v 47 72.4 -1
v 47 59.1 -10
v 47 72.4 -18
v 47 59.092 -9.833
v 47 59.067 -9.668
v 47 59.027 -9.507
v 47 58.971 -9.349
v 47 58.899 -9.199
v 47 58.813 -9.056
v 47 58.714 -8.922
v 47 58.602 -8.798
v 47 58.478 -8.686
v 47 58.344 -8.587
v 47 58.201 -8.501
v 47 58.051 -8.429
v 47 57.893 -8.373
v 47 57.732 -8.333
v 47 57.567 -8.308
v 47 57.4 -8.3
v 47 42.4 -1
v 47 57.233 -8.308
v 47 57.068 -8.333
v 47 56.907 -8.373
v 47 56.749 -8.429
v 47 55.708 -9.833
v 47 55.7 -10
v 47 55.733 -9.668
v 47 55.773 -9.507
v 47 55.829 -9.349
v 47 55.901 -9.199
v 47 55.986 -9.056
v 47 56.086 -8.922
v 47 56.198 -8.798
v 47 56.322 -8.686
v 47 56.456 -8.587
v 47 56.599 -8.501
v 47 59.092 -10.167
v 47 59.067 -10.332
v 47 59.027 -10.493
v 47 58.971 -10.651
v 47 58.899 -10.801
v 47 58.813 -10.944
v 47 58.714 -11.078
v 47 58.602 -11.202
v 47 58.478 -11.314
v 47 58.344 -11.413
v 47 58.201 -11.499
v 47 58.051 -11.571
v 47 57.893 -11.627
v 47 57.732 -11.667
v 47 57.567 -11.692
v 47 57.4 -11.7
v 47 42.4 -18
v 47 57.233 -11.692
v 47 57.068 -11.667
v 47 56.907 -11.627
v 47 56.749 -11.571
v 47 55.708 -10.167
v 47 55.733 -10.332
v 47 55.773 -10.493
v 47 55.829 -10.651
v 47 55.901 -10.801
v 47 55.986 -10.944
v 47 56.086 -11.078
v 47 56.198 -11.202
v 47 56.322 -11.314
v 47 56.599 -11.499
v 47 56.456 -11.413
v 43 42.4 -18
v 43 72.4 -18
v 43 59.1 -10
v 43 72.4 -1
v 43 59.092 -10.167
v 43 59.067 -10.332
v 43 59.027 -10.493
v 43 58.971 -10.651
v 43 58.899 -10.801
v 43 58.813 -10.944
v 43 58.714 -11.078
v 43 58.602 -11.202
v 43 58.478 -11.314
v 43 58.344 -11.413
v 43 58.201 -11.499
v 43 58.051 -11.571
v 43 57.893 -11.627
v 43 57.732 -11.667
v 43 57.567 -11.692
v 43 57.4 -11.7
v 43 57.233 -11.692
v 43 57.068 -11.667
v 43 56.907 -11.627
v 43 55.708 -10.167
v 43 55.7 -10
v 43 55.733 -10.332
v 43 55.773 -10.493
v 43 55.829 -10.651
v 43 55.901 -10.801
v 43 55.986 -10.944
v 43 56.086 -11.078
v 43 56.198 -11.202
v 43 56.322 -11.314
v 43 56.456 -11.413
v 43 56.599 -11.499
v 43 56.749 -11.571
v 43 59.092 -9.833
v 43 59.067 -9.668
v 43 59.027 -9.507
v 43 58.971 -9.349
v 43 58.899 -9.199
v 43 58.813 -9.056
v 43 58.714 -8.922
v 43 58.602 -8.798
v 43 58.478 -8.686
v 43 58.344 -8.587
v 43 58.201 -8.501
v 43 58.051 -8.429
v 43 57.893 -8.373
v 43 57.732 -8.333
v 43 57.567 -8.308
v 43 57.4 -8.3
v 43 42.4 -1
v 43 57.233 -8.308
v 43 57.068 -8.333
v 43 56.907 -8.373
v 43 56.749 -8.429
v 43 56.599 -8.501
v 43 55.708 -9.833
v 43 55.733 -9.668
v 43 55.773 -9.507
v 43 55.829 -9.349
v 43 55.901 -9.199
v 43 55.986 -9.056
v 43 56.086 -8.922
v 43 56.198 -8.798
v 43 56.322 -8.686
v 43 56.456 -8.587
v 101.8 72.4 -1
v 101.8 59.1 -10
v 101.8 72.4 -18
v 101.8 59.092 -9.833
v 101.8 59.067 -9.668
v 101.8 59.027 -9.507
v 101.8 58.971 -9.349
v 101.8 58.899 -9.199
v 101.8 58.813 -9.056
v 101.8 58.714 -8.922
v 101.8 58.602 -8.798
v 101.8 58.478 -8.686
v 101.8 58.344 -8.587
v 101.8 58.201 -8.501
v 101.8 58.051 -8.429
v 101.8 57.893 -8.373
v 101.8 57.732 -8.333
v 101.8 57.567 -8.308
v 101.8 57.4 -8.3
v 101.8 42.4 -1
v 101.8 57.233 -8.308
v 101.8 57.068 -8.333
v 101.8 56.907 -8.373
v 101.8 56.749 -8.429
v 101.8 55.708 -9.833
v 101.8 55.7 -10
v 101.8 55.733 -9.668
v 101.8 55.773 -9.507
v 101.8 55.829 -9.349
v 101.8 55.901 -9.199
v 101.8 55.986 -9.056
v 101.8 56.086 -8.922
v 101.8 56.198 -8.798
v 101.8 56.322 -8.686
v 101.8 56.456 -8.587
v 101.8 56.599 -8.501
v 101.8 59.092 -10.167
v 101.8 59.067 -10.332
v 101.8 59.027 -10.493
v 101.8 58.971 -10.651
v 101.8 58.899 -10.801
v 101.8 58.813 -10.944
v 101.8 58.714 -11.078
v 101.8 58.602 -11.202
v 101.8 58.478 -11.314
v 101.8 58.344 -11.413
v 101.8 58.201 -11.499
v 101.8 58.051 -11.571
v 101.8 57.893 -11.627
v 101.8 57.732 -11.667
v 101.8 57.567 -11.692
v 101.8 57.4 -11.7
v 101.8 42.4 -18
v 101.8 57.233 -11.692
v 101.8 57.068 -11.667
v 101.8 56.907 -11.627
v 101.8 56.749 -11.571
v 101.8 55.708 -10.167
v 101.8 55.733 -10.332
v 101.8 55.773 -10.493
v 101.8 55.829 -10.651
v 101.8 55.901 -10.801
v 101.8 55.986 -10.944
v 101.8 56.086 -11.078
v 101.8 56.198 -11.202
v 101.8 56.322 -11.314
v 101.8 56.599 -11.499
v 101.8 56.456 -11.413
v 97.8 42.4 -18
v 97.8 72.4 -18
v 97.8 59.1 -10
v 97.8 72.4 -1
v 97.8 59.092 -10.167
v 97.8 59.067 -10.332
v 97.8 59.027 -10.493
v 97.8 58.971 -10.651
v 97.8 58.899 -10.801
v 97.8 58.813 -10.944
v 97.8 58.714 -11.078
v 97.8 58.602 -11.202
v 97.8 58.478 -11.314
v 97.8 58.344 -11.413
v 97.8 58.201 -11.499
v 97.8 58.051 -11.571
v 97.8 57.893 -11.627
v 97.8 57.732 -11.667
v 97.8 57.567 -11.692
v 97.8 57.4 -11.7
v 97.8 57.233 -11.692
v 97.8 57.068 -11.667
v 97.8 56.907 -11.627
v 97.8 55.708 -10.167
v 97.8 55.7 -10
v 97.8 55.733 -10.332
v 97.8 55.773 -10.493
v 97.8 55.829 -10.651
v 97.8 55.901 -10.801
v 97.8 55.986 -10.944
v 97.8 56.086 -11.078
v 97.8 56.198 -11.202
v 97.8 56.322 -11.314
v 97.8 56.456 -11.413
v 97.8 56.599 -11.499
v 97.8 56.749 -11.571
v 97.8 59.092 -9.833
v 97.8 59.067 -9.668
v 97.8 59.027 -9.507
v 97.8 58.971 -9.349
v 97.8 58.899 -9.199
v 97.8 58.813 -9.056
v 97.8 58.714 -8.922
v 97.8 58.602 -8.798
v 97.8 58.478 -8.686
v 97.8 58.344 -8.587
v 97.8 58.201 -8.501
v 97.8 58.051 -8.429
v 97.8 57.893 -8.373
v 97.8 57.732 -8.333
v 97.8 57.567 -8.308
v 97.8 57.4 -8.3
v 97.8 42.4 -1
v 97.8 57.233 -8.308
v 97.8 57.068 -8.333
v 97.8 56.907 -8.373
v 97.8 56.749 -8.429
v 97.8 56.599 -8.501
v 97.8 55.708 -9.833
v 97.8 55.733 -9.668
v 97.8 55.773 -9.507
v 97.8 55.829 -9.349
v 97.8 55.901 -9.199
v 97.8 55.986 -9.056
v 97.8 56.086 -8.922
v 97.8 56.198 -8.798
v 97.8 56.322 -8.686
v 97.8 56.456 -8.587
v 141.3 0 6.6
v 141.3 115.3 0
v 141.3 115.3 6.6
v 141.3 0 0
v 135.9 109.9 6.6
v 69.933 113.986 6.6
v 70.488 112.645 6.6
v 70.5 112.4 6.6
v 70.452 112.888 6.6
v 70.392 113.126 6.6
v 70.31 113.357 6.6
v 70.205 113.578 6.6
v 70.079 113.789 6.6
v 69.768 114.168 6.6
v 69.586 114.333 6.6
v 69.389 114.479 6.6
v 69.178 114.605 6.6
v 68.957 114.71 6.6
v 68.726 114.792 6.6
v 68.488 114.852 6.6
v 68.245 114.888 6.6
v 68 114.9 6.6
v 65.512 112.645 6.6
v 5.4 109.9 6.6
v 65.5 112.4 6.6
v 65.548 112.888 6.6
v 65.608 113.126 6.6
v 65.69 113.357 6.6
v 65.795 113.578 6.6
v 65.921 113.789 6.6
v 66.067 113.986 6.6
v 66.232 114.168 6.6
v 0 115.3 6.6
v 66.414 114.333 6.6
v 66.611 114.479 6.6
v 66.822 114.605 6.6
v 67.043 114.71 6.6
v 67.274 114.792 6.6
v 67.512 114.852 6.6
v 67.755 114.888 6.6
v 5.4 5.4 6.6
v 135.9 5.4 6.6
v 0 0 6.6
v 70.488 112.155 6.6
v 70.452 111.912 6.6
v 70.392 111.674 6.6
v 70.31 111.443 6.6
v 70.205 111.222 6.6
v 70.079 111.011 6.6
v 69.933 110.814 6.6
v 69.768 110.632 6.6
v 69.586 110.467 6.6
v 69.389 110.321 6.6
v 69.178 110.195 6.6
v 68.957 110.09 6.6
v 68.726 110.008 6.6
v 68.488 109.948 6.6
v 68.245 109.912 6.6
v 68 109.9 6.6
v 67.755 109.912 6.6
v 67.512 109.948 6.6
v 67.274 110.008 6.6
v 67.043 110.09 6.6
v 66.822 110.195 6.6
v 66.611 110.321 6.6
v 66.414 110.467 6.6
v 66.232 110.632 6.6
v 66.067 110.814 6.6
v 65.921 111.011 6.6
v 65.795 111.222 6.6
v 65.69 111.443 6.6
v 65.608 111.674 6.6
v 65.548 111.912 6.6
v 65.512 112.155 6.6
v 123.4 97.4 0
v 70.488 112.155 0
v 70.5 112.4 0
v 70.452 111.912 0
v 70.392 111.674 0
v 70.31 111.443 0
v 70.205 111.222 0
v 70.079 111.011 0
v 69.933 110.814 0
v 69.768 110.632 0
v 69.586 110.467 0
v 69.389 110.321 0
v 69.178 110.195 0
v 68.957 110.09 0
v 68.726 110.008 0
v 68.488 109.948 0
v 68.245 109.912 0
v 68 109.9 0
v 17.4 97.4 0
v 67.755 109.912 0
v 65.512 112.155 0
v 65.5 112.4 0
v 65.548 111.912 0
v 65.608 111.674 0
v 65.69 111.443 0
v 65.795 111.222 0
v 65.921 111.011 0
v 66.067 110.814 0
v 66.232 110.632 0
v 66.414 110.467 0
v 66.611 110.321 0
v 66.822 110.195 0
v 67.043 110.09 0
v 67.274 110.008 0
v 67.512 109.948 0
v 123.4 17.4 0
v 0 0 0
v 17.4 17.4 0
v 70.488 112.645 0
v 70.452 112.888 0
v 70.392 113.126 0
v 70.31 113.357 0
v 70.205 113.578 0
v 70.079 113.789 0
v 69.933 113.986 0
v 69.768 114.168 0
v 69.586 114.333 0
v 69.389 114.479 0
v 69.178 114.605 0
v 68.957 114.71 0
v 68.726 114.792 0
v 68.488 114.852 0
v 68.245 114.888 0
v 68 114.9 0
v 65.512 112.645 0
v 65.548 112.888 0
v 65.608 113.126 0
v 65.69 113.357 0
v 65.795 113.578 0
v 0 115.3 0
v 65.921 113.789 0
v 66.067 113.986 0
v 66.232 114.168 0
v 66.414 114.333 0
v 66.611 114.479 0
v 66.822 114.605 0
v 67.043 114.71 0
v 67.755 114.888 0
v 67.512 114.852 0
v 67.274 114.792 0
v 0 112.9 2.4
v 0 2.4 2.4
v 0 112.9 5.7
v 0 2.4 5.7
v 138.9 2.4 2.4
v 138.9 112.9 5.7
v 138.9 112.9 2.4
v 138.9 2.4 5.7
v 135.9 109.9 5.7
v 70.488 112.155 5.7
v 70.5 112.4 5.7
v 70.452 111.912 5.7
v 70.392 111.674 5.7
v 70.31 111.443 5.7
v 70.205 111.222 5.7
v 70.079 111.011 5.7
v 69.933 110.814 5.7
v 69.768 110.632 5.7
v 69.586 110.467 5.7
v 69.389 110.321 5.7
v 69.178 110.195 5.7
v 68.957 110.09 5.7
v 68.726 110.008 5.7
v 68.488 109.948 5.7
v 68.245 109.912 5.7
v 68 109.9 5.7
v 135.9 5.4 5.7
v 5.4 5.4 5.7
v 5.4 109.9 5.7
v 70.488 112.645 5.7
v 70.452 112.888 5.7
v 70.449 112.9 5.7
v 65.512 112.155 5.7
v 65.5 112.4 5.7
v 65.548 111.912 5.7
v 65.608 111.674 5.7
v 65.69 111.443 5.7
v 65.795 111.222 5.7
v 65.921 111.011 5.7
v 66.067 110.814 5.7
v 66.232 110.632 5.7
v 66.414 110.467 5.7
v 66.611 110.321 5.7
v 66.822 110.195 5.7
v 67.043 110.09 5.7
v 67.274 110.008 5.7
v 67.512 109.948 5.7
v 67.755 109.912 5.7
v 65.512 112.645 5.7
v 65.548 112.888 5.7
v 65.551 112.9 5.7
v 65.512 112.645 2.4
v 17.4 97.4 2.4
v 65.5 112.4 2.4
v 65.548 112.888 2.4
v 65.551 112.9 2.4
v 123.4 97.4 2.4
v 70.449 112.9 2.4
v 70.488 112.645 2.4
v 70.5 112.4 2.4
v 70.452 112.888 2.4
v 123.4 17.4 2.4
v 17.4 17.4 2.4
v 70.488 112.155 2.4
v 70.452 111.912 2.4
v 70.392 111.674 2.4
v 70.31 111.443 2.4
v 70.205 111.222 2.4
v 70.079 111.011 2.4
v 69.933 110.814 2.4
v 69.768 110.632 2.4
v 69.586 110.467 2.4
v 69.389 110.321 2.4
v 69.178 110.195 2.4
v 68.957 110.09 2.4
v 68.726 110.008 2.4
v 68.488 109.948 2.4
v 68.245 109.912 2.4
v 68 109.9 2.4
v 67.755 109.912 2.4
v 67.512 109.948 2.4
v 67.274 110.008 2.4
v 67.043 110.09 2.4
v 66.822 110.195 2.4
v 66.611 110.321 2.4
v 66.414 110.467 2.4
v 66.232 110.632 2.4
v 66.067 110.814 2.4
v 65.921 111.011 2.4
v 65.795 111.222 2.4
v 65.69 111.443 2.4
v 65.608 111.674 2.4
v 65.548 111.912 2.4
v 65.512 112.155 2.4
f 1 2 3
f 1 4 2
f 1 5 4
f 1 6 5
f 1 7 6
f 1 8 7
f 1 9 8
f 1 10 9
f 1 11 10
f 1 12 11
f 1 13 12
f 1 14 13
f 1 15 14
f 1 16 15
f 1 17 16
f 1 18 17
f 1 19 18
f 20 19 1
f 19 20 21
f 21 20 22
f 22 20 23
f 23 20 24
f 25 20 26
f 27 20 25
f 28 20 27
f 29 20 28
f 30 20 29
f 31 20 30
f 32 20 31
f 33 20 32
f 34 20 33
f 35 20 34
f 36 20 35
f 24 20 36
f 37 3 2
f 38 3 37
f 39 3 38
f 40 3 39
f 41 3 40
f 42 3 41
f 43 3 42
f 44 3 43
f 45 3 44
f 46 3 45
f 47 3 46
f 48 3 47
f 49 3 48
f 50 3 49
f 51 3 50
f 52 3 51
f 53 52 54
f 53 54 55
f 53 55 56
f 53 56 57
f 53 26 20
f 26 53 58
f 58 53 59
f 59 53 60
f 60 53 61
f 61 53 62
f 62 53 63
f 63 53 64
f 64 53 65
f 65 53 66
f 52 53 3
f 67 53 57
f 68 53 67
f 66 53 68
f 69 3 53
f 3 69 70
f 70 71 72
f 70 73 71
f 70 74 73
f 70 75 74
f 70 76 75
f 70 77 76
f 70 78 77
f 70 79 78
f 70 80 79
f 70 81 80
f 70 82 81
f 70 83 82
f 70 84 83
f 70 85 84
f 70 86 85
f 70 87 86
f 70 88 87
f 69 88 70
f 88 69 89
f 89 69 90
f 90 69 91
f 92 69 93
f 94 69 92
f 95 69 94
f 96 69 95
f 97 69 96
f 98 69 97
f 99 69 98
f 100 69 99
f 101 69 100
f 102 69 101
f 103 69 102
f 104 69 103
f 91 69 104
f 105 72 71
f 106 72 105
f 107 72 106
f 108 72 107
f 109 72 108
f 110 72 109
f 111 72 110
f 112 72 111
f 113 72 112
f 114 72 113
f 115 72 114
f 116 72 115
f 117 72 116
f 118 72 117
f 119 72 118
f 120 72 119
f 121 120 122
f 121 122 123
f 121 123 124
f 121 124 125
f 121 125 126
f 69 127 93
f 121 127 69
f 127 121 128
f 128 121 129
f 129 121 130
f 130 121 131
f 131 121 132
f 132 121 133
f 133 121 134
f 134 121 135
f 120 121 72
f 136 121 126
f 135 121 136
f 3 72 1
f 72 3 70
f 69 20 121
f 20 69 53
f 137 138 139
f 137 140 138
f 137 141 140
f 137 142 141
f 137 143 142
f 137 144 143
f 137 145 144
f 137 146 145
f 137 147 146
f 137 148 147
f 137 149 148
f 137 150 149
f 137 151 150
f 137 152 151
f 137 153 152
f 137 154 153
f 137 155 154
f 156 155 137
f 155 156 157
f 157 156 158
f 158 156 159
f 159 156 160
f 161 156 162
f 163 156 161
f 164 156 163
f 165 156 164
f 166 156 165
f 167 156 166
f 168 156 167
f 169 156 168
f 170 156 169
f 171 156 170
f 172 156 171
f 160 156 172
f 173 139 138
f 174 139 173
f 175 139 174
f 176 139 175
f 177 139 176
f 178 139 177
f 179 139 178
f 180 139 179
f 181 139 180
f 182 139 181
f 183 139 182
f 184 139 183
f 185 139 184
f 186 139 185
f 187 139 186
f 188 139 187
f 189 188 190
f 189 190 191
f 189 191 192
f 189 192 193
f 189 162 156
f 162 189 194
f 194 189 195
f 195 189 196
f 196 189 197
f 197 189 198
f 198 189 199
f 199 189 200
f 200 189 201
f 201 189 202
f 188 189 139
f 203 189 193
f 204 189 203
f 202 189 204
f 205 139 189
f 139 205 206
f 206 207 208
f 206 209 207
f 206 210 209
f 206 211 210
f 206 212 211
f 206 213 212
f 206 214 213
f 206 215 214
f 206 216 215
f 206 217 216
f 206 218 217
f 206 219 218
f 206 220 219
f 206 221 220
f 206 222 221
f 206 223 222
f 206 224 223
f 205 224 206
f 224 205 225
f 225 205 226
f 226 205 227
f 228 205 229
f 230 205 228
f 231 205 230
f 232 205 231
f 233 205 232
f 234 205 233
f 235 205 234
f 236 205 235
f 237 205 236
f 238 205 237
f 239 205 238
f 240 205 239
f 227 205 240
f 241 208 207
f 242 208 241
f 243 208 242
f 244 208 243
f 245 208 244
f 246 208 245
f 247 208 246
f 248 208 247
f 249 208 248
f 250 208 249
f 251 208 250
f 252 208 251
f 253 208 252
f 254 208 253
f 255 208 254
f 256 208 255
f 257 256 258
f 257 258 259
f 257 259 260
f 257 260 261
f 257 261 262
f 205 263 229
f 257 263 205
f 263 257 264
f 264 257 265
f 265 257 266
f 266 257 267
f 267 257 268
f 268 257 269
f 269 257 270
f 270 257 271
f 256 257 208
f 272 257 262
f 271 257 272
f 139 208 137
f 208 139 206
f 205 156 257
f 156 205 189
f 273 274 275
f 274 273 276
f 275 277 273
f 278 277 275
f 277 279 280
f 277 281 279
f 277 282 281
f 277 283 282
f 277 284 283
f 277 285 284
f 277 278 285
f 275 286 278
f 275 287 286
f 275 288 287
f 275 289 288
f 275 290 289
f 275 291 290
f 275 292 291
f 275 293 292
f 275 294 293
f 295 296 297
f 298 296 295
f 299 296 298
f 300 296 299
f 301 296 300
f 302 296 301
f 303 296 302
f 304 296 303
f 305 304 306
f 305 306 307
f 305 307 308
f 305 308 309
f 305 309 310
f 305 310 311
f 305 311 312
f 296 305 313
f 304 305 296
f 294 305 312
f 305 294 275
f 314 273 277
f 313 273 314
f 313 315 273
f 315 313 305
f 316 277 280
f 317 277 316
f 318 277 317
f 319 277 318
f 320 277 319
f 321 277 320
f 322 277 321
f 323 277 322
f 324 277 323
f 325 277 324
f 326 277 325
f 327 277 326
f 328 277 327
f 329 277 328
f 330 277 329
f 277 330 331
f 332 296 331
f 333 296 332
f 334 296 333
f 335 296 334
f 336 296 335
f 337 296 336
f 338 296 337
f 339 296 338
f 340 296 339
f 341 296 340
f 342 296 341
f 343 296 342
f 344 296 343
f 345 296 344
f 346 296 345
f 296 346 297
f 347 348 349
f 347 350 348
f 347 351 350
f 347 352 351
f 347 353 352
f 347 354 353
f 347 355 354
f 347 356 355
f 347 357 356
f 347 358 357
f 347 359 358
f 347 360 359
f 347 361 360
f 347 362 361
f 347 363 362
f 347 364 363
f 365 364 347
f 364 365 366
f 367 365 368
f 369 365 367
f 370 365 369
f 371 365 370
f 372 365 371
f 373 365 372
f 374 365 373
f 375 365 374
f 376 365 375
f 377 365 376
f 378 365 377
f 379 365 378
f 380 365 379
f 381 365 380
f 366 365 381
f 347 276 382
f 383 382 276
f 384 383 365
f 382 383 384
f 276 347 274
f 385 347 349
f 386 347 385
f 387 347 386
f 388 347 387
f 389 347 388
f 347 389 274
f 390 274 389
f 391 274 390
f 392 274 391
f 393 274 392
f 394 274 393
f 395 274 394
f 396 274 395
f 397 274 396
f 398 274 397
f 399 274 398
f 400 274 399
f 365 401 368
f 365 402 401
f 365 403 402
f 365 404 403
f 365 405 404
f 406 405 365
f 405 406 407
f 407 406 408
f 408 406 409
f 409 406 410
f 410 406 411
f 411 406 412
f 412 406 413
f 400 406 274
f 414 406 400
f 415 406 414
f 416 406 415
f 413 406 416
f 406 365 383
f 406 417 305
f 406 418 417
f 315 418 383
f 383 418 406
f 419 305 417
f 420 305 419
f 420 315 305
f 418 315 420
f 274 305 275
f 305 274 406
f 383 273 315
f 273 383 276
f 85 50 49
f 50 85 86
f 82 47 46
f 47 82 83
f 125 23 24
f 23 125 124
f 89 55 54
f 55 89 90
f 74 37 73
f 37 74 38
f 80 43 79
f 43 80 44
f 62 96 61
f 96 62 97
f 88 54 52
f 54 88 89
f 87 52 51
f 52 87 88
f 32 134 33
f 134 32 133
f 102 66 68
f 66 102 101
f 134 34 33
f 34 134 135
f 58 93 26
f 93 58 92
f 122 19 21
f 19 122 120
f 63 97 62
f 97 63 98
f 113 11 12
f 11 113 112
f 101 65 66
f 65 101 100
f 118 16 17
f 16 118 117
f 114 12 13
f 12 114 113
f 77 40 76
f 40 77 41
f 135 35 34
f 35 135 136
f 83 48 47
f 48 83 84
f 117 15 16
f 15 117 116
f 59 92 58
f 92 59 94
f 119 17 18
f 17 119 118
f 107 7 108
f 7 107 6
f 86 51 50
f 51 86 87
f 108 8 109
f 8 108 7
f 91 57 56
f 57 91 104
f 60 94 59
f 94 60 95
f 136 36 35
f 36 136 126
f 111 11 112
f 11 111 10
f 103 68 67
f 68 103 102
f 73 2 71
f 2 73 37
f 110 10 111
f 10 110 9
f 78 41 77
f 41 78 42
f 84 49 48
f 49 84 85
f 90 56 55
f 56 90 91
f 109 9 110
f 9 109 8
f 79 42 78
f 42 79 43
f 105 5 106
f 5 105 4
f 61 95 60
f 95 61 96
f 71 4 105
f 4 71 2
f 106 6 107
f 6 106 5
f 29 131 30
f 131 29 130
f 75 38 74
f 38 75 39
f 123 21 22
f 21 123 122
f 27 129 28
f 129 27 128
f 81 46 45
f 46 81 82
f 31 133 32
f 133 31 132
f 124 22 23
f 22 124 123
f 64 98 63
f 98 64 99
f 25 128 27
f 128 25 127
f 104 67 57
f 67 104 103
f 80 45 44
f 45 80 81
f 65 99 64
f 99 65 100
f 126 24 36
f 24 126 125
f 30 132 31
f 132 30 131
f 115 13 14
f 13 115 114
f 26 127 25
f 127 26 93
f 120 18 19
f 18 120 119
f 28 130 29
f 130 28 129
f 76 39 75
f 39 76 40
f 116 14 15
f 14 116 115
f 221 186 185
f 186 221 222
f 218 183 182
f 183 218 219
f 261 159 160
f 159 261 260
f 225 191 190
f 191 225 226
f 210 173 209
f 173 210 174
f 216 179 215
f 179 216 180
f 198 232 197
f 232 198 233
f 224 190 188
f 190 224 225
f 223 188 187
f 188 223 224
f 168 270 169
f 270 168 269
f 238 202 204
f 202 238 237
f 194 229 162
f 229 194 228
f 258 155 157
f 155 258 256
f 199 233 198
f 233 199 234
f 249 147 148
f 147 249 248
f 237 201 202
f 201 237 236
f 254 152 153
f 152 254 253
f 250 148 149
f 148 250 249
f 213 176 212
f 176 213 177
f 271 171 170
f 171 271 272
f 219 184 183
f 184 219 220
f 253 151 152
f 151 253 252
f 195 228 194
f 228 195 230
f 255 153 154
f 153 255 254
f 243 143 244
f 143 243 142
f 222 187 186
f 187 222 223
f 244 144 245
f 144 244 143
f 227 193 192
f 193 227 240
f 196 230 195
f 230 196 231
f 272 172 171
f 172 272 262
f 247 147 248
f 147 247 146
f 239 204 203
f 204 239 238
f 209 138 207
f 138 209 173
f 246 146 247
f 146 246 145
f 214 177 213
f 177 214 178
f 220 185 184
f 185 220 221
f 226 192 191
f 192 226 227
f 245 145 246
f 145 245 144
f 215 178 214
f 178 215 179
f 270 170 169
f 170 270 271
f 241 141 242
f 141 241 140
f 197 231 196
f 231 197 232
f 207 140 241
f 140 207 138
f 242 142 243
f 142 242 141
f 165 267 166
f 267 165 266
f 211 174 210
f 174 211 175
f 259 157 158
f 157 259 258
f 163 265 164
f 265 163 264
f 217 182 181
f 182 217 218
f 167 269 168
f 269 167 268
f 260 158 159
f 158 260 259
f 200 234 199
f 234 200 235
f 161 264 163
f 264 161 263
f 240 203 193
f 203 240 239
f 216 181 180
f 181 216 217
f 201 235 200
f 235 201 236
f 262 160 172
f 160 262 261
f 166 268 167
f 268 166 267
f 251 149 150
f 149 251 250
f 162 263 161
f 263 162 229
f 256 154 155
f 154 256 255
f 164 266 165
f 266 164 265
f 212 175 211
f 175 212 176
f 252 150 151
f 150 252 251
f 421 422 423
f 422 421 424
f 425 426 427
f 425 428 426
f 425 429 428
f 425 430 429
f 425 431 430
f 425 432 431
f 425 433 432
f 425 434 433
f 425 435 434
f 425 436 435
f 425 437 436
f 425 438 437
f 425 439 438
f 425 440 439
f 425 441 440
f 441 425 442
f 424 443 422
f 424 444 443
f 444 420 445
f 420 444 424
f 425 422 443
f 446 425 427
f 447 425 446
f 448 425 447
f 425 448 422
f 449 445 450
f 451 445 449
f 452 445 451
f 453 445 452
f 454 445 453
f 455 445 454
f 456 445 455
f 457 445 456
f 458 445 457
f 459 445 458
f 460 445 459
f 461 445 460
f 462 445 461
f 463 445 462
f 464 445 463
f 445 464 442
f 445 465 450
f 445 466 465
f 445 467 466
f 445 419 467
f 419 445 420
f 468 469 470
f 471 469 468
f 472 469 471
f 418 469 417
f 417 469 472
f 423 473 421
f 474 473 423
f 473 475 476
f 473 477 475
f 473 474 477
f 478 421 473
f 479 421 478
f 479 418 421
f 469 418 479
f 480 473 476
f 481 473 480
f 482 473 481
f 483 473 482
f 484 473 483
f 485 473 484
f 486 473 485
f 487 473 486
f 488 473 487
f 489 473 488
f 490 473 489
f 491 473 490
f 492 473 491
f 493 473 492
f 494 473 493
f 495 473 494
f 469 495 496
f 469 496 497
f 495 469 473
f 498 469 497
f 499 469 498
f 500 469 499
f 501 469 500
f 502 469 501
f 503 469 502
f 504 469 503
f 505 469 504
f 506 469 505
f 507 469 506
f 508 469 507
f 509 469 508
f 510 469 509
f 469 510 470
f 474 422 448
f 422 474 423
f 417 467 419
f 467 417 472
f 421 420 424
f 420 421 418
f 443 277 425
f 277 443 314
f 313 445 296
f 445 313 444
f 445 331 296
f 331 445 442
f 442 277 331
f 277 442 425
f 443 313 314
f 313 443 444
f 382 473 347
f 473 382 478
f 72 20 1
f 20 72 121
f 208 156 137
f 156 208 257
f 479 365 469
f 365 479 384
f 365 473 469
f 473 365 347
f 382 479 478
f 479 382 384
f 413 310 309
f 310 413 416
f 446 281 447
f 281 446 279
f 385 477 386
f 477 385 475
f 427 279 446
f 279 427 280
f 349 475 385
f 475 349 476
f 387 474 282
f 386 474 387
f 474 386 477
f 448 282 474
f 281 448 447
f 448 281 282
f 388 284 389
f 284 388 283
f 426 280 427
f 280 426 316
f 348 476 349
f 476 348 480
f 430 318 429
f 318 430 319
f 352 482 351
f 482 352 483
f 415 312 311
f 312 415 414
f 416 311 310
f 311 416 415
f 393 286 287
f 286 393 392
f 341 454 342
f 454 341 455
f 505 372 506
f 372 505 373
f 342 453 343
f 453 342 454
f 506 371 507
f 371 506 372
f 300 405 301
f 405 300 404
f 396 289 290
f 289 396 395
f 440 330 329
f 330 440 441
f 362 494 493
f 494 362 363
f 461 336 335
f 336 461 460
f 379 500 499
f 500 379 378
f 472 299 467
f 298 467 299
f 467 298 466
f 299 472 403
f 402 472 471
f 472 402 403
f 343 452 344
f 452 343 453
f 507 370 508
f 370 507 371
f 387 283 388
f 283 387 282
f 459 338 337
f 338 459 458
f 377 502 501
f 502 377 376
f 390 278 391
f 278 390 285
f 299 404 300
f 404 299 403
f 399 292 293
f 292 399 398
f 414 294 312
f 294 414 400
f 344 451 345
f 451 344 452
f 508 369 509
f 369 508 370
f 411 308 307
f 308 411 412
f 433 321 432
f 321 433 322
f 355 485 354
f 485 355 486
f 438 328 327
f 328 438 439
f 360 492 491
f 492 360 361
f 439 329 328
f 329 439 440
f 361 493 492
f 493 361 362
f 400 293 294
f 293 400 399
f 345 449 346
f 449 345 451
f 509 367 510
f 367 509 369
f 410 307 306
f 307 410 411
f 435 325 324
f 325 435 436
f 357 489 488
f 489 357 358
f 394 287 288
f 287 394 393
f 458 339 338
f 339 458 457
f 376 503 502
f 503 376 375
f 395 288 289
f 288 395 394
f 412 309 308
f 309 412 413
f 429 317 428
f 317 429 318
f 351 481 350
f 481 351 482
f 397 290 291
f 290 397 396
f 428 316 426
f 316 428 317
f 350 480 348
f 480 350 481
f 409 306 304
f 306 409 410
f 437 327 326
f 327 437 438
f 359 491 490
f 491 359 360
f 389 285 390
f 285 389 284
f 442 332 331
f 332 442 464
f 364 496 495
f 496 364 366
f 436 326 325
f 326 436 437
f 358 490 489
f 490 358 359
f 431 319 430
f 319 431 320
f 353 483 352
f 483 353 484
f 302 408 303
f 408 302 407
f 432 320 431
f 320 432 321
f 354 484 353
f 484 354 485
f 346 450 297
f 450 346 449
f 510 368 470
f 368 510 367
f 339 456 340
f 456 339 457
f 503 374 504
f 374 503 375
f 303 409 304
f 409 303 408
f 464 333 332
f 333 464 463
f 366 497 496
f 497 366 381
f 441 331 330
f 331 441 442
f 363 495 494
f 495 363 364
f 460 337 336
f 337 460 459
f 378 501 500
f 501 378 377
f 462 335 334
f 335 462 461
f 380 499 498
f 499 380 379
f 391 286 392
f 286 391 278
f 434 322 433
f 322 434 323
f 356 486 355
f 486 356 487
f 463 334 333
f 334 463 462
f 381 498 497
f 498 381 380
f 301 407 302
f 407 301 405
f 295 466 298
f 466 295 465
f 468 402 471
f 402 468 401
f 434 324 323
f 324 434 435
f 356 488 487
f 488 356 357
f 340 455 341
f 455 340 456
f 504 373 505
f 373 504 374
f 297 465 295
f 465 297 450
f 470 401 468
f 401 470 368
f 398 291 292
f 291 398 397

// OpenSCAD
// file: comun.scad
// FieldShift · estación de campo · parámetros comunes (mm)
// Material: PETG o ASA (no PLA: se deforma al sol arriba de ~55 °C). Boquilla 0,4 mm, capas 0,2 mm.
$fn = 64;
tol      = 0.25;   // juego entre piezas que encastran (0,2–0,3 mm)
tol_eje  = 0.30;   // juego del eje del balancín (clavo o varilla de 2 mm)
pared    = 3.0;    // pared exterior (7–8 perímetros con 0,4 mm: estanca)
// inserto roscado M3 a calor (M3×5,7, Ø ext 4,6): agujero 4,0 × 6
ins_d = 4.0;  ins_h = 6.0;
m3_paso = 3.4;     // agujero pasante M3
m3_cab  = 6.2;     // cabeza M3 (avellanado plano)
m3_tuerca = 5.5 + 0.3; // tuerca M3 entre caras + juego
pg7_d   = 12.7;    // prensaestopas PG7: rosca 12,5 mm + juego
// tubo PVC: ½" SCH40 = 21,3 mm de diámetro exterior; ¾" = 26,7 mm
tubo_d  = 21.3;

module redondeado(l, a, h, r) {
  // prisma de l × a × h con esquinas verticales redondeadas de radio r
  hull() for (x = [r, l - r], y = [r, a - r]) translate([x, y, 0]) cylinder(r = r, h = h);
}
module inserto() { translate([0, 0, -0.01]) cylinder(d = ins_d, h = ins_h + 0.01); }
// main file
// Soporte del panel solar (6 V, 1–2 W) inclinado y orientado al ecuador (al sur en el hemisferio norte).
// Inclinación: `angulo`. Regla práctica para todo el año: ≈ latitud, nunca menos de 10–15° para que la
// lluvia lo limpie. Guatemala (14–18° N) → 15°. Ajustable de 0 a 45° con la ranura en arco (tornillo M3).
// Partes: bandeja (abraza el panel), 2 orejas laterales con eje M3 y ranura en arco, y la placa a la
// abrazadera del tubo (abrazadera_brazo de abrazadera.scad, 2 agujeros a 30 mm).
// Impresión: bandeja plana sin soportes; orejas de costado sin soportes.
include <comun.scad>

latitud = 14.8;                     // Jocotán
angulo  = max(15, round(abs(latitud)));
panel_l = 136; panel_a = 110; panel_t = 3.0;  // panel típico 6 V 2 W (1 W: 110 × 60)
parte = "bandeja"; // bandeja | oreja | todo
echo(str("inclinacion sugerida para latitud ", latitud, ": ", angulo, " grados"));

bt = 2.4;   // espesor
module bandeja() {
  difference() {
    union() {
      cube([panel_l + 2 * bt + 2 * tol, panel_a + 2 * bt + 2 * tol, bt + panel_t + 1.2]);
      // lengüetas de las orejas (abajo, al centro)
      for (x = [panel_l / 2 - 25, panel_l / 2 + 25 + 2 * bt]) translate([x, panel_a / 2 + bt - 15, -18]) cube([4, 30, 18.01]);
    }
    // alojamiento del panel con 1,2 mm de borde que lo retiene (el panel entra de costado)
    translate([bt, bt, bt]) cube([panel_l + 2 * tol, panel_a + 2 * tol, panel_t + 0.3]);
    translate([bt + 3, bt + 3, bt]) cube([panel_l + 2 * tol - 6, panel_a + 2 * tol - 6, 10]);
    translate([-1, bt, bt]) cube([bt + 2, panel_a + 2 * tol, panel_t + 0.3]);   // entrada lateral
    translate([bt + 15, bt + 15, -1]) cube([panel_l - 30, panel_a - 30, bt + 2]); // ventana (aliviana, ventila)
    for (x = [panel_l / 2 - 25 - 1, panel_l / 2 + 25 + 2 * bt - 1]) translate([x, panel_a / 2 + bt, -10]) rotate([0, 90, 0]) cylinder(d = m3_paso, h = 7);
    translate([panel_l / 2, panel_a + bt, -1]) cylinder(d = 5, h = 10); // cable
  }
}
// oreja: pivote M3 arriba, ranura en arco de 0 a 45° (radio 22) y pie con 2 agujeros a 30 mm
module oreja() {
  rr = 22;
  difference() {
    union() {
      hull() { translate([0, 0, 0]) cylinder(r = 8, h = 4); translate([-25, -rr - 12, 0]) cube([50, 6, 4]); }
      translate([-25, -rr - 12, 0]) cube([50, 6, 16]);
    }
    translate([0, 0, -1]) cylinder(d = m3_paso, h = 6);
    rotate([0, 0, -135]) translate([0, 0, -1]) {  // ranura en arco de 45° (radio rr·0,75) con puntas redondas
      rotate_extrude(angle = 45) translate([rr * 0.75 - m3_paso / 2, 0]) square([m3_paso, 6]);
      for (a = [0, 45]) rotate([0, 0, a]) translate([rr * 0.75, 0, 0]) cylinder(d = m3_paso, h = 6);
    }
    for (x = [-15, 15]) translate([x, -rr - 13, 10]) rotate([-90, 0, 0]) cylinder(d = m3_paso, h = 8);
  }
}
if (parte == "bandeja") bandeja();
if (parte == "oreja") oreja();
if (parte == "todo") {
  color("#e9e4d8") for (y = [0, 1]) translate([0, y * 30, 0]) rotate([90, 0, 0]) oreja();
  color("#1b3a5c") translate([-(panel_l / 2 + bt + 12), -10, 30]) rotate([angulo, 0, 0]) bandeja();
}
